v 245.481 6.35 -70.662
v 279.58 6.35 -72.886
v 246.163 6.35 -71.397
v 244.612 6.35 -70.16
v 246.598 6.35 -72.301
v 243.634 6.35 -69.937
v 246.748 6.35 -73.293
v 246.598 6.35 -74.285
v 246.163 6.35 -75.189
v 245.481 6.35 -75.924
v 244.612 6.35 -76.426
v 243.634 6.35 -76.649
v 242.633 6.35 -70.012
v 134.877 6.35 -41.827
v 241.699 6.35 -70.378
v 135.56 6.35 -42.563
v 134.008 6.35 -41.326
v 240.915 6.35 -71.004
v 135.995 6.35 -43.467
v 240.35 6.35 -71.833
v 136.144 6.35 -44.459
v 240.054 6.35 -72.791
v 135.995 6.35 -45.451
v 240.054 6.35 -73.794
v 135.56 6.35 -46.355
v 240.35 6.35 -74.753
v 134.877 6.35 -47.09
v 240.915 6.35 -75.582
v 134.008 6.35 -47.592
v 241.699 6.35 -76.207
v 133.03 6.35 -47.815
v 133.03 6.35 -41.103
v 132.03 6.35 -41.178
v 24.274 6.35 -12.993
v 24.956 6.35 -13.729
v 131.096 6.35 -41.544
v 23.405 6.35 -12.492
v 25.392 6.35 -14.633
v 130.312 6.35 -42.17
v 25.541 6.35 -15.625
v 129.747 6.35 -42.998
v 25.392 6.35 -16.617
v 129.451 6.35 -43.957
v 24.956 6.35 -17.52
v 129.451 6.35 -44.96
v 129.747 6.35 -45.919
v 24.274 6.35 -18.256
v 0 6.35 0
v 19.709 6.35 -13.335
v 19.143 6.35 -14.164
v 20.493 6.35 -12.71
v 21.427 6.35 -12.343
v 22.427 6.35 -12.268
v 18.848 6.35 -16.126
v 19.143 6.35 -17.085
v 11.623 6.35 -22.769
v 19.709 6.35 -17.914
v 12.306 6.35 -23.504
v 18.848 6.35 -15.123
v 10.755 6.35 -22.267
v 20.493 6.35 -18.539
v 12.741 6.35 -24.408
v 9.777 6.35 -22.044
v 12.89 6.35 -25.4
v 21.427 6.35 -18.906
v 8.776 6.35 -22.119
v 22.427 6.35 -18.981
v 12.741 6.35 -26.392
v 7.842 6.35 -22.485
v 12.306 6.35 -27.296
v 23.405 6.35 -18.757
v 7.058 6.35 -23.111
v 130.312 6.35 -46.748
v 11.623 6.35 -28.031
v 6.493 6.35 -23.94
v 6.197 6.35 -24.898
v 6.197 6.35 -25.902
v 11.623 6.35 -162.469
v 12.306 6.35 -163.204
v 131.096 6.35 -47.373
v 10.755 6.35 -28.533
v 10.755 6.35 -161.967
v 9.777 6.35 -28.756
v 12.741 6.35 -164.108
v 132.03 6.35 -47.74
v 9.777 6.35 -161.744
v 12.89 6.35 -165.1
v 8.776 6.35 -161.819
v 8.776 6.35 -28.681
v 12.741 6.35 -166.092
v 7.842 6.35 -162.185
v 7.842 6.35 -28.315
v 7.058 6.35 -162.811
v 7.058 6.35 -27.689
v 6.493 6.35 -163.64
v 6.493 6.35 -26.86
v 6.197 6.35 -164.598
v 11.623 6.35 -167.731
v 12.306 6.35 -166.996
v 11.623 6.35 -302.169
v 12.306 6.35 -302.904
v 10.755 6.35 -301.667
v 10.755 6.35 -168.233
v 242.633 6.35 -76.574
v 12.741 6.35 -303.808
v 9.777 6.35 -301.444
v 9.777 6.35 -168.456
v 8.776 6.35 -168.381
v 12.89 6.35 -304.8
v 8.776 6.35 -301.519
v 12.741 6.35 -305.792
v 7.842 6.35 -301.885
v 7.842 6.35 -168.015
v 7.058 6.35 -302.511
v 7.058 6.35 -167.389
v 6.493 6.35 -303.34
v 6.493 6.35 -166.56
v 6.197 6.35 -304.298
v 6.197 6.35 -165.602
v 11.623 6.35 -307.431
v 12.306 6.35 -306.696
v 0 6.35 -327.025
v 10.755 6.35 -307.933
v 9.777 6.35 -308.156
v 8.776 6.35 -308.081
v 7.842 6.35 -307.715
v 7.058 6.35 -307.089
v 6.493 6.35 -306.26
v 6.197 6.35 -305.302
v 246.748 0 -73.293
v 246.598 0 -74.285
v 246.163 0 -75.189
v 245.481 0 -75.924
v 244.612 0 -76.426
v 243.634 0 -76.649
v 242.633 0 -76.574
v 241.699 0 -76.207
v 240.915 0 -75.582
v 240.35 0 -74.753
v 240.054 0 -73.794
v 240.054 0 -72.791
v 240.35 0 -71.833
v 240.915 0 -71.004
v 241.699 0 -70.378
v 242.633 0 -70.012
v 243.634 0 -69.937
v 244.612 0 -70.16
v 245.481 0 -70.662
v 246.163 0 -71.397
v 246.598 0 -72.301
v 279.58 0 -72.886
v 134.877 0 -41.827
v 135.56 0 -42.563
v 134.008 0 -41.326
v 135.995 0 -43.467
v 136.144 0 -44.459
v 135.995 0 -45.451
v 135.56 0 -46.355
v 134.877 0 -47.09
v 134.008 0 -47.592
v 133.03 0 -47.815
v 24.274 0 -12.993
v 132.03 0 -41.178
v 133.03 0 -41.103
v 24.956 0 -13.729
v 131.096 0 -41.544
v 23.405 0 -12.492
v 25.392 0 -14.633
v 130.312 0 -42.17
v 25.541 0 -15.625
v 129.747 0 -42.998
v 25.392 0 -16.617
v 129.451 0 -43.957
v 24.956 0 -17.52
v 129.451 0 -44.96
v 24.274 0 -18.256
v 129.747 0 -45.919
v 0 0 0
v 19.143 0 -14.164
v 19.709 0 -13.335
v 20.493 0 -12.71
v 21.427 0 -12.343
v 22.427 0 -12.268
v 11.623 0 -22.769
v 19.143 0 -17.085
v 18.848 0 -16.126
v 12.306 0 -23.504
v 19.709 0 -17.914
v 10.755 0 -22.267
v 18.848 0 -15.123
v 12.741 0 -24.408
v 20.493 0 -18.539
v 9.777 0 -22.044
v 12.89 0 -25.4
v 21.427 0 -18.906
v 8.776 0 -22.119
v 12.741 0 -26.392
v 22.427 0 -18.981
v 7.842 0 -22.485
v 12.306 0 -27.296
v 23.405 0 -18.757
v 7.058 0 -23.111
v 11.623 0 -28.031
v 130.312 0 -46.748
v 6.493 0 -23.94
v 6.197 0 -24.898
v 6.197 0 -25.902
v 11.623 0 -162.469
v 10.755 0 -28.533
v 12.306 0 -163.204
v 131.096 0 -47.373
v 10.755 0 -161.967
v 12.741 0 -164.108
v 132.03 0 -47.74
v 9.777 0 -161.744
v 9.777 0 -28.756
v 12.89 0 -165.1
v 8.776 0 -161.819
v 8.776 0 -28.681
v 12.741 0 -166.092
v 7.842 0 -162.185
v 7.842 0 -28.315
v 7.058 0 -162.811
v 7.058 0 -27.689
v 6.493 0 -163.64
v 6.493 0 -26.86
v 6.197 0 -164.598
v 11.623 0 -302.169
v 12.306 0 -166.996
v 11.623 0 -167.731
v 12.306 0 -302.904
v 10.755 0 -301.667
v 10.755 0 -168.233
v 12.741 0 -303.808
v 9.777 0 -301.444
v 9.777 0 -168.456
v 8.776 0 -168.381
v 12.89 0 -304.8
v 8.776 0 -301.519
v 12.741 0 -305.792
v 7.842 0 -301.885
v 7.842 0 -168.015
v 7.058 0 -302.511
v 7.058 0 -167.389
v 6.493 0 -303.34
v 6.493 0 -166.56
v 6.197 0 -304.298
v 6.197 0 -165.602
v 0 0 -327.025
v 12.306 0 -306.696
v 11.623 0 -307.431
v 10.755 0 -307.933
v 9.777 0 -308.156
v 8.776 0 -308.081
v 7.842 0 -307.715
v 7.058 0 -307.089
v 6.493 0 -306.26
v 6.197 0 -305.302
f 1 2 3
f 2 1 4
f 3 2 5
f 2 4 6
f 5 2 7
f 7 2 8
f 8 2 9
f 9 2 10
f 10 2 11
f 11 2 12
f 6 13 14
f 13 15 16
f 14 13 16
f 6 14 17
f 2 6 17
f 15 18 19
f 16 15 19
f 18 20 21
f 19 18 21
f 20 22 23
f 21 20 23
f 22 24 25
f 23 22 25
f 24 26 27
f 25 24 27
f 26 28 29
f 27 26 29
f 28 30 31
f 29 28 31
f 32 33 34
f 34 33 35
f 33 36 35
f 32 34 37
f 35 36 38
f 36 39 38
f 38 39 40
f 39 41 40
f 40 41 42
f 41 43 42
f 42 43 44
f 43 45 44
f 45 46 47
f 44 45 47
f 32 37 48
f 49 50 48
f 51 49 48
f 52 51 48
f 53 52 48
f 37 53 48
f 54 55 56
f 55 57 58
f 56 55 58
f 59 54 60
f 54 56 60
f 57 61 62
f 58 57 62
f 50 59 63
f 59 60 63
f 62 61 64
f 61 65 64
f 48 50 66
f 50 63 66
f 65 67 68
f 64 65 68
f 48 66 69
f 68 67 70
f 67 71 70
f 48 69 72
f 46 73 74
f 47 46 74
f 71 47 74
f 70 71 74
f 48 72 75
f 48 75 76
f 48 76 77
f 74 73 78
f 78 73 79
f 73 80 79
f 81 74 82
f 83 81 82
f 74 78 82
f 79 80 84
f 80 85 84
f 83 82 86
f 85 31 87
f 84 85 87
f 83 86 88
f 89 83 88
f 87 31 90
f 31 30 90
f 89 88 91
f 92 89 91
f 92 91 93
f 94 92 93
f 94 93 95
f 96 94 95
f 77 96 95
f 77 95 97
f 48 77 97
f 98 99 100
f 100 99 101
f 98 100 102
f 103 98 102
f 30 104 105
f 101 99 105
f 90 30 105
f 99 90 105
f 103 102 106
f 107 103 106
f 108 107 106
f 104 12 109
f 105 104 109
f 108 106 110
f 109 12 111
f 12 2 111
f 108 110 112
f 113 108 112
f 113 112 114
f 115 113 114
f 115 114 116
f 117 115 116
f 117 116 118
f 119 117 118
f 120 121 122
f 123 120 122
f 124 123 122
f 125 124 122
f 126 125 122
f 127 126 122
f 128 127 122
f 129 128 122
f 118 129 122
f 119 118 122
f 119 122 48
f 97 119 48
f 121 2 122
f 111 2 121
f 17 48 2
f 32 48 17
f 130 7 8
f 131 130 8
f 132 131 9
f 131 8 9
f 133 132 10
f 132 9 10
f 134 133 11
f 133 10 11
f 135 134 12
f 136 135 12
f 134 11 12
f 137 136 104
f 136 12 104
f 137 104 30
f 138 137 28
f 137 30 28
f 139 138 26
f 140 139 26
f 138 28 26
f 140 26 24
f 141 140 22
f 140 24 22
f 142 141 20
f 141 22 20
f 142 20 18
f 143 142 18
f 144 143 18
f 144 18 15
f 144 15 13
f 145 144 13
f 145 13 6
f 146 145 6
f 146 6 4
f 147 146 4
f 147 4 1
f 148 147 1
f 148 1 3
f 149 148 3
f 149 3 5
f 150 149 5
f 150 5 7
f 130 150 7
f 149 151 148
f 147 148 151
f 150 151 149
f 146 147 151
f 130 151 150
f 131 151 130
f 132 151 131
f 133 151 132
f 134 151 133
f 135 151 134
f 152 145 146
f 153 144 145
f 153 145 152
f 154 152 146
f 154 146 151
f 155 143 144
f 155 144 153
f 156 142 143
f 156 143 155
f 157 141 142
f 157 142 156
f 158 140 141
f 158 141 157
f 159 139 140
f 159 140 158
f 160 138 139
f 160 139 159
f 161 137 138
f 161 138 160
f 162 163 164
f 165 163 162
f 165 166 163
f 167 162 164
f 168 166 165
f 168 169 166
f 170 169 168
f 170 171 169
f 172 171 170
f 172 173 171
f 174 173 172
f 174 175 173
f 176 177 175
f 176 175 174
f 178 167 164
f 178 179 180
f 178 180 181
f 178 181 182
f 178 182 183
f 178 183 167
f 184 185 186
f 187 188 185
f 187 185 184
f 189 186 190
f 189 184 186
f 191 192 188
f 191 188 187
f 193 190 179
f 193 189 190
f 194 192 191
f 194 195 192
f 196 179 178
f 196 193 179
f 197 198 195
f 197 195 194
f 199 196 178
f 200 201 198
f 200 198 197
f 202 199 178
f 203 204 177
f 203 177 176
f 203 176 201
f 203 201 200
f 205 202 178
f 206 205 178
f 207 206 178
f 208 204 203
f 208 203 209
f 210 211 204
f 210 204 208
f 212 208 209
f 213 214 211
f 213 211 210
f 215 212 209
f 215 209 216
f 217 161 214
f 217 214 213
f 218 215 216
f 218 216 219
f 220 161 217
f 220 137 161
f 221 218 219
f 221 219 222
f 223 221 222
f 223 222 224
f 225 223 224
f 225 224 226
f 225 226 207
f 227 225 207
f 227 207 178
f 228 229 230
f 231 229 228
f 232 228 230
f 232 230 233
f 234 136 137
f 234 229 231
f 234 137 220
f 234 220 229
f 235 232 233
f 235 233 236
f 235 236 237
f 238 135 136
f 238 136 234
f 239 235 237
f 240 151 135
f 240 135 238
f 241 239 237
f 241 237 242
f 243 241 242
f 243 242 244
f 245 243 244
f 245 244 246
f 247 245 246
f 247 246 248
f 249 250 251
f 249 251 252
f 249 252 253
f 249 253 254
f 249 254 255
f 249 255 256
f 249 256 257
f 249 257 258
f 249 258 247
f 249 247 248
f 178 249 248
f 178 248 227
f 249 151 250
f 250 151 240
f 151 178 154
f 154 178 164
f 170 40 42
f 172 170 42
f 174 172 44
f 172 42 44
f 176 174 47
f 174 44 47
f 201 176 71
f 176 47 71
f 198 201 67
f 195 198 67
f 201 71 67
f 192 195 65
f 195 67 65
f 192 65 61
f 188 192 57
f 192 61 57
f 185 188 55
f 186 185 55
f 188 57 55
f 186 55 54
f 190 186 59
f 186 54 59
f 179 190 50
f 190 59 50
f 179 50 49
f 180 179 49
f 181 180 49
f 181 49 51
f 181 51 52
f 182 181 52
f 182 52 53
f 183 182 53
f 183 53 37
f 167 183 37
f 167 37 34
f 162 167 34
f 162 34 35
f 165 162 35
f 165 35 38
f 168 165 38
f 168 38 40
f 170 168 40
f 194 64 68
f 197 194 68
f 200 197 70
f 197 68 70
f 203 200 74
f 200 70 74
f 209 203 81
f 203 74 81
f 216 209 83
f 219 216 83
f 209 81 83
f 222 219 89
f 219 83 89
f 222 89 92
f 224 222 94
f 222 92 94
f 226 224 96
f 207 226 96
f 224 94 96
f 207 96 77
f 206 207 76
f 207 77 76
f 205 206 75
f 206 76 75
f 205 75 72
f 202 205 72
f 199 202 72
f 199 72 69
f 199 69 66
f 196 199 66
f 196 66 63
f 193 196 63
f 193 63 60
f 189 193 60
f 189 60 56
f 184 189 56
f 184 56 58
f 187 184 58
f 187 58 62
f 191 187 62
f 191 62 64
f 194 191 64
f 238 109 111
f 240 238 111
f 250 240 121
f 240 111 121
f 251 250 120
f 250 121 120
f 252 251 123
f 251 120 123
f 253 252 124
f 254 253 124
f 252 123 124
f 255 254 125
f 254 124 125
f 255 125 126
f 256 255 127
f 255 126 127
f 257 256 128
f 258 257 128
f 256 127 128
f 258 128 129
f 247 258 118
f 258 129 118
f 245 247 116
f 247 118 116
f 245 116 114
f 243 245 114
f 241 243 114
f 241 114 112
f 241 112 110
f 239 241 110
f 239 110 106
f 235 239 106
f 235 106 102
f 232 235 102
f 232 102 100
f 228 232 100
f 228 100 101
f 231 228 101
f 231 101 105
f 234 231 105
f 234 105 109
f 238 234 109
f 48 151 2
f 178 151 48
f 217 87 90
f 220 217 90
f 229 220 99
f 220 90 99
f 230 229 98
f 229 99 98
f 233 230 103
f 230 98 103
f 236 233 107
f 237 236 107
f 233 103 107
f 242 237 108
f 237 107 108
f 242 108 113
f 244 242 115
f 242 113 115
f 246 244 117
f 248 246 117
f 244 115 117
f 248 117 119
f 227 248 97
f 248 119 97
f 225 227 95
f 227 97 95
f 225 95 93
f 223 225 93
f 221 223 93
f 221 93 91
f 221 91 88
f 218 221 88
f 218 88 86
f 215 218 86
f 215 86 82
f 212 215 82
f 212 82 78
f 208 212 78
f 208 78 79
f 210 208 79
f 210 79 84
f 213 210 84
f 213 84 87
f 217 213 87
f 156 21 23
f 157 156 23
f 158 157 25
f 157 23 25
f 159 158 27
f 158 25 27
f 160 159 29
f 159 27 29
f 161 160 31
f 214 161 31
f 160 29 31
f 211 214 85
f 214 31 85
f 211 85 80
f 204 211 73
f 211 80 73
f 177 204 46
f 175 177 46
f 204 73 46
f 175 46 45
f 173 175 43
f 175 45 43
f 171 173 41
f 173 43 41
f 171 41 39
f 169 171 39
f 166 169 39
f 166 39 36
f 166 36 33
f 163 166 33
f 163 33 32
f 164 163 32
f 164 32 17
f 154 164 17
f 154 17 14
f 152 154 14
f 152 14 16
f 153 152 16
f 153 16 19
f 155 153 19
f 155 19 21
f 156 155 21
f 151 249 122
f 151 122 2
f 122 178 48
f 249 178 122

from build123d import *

# Parameters (mm, degrees)
BOSS_EXTRUDE1_DEPTH = 6.35
SKETCH2_R           = 3.3655
CUT_EXTRUDE1_DEPTH  = 7.35


with BuildPart() as part:
    # Sketch1 → Boss-Extrude1 (new body)
    with BuildSketch(Plane(origin=(0, 0, 0), x_dir=(1, 0, 0), z_dir=(0, 1, 0))):
        Polygon((0, 0), (0, 327.025), (279.580480146, 72.886286408), align=None)
    extrude(amount=BOSS_EXTRUDE1_DEPTH)

    # Sketch2 → Cut-Extrude1 (cut, through all)
    with BuildSketch(Plane(origin=(0, 6.35, 0), x_dir=(1, 0, 0), z_dir=(0, 1, 0))):
        with Locations((9.525, 25.4)):
            Circle(SKETCH2_R)
        with Locations((9.525, 165.1)):
            Circle(SKETCH2_R)
        with Locations((9.525, 304.8)):
            Circle(SKETCH2_R)
        with Locations((22.175659142, 15.624524524)):
            Circle(SKETCH2_R)
        with Locations((132.778926013, 44.458659806)):
            Circle(SKETCH2_R)
        with Locations((243.382192884, 73.292795089)):
            Circle(SKETCH2_R)
    extrude(amount=-CUT_EXTRUDE1_DEPTH, mode=Mode.SUBTRACT)


solid = part.part
